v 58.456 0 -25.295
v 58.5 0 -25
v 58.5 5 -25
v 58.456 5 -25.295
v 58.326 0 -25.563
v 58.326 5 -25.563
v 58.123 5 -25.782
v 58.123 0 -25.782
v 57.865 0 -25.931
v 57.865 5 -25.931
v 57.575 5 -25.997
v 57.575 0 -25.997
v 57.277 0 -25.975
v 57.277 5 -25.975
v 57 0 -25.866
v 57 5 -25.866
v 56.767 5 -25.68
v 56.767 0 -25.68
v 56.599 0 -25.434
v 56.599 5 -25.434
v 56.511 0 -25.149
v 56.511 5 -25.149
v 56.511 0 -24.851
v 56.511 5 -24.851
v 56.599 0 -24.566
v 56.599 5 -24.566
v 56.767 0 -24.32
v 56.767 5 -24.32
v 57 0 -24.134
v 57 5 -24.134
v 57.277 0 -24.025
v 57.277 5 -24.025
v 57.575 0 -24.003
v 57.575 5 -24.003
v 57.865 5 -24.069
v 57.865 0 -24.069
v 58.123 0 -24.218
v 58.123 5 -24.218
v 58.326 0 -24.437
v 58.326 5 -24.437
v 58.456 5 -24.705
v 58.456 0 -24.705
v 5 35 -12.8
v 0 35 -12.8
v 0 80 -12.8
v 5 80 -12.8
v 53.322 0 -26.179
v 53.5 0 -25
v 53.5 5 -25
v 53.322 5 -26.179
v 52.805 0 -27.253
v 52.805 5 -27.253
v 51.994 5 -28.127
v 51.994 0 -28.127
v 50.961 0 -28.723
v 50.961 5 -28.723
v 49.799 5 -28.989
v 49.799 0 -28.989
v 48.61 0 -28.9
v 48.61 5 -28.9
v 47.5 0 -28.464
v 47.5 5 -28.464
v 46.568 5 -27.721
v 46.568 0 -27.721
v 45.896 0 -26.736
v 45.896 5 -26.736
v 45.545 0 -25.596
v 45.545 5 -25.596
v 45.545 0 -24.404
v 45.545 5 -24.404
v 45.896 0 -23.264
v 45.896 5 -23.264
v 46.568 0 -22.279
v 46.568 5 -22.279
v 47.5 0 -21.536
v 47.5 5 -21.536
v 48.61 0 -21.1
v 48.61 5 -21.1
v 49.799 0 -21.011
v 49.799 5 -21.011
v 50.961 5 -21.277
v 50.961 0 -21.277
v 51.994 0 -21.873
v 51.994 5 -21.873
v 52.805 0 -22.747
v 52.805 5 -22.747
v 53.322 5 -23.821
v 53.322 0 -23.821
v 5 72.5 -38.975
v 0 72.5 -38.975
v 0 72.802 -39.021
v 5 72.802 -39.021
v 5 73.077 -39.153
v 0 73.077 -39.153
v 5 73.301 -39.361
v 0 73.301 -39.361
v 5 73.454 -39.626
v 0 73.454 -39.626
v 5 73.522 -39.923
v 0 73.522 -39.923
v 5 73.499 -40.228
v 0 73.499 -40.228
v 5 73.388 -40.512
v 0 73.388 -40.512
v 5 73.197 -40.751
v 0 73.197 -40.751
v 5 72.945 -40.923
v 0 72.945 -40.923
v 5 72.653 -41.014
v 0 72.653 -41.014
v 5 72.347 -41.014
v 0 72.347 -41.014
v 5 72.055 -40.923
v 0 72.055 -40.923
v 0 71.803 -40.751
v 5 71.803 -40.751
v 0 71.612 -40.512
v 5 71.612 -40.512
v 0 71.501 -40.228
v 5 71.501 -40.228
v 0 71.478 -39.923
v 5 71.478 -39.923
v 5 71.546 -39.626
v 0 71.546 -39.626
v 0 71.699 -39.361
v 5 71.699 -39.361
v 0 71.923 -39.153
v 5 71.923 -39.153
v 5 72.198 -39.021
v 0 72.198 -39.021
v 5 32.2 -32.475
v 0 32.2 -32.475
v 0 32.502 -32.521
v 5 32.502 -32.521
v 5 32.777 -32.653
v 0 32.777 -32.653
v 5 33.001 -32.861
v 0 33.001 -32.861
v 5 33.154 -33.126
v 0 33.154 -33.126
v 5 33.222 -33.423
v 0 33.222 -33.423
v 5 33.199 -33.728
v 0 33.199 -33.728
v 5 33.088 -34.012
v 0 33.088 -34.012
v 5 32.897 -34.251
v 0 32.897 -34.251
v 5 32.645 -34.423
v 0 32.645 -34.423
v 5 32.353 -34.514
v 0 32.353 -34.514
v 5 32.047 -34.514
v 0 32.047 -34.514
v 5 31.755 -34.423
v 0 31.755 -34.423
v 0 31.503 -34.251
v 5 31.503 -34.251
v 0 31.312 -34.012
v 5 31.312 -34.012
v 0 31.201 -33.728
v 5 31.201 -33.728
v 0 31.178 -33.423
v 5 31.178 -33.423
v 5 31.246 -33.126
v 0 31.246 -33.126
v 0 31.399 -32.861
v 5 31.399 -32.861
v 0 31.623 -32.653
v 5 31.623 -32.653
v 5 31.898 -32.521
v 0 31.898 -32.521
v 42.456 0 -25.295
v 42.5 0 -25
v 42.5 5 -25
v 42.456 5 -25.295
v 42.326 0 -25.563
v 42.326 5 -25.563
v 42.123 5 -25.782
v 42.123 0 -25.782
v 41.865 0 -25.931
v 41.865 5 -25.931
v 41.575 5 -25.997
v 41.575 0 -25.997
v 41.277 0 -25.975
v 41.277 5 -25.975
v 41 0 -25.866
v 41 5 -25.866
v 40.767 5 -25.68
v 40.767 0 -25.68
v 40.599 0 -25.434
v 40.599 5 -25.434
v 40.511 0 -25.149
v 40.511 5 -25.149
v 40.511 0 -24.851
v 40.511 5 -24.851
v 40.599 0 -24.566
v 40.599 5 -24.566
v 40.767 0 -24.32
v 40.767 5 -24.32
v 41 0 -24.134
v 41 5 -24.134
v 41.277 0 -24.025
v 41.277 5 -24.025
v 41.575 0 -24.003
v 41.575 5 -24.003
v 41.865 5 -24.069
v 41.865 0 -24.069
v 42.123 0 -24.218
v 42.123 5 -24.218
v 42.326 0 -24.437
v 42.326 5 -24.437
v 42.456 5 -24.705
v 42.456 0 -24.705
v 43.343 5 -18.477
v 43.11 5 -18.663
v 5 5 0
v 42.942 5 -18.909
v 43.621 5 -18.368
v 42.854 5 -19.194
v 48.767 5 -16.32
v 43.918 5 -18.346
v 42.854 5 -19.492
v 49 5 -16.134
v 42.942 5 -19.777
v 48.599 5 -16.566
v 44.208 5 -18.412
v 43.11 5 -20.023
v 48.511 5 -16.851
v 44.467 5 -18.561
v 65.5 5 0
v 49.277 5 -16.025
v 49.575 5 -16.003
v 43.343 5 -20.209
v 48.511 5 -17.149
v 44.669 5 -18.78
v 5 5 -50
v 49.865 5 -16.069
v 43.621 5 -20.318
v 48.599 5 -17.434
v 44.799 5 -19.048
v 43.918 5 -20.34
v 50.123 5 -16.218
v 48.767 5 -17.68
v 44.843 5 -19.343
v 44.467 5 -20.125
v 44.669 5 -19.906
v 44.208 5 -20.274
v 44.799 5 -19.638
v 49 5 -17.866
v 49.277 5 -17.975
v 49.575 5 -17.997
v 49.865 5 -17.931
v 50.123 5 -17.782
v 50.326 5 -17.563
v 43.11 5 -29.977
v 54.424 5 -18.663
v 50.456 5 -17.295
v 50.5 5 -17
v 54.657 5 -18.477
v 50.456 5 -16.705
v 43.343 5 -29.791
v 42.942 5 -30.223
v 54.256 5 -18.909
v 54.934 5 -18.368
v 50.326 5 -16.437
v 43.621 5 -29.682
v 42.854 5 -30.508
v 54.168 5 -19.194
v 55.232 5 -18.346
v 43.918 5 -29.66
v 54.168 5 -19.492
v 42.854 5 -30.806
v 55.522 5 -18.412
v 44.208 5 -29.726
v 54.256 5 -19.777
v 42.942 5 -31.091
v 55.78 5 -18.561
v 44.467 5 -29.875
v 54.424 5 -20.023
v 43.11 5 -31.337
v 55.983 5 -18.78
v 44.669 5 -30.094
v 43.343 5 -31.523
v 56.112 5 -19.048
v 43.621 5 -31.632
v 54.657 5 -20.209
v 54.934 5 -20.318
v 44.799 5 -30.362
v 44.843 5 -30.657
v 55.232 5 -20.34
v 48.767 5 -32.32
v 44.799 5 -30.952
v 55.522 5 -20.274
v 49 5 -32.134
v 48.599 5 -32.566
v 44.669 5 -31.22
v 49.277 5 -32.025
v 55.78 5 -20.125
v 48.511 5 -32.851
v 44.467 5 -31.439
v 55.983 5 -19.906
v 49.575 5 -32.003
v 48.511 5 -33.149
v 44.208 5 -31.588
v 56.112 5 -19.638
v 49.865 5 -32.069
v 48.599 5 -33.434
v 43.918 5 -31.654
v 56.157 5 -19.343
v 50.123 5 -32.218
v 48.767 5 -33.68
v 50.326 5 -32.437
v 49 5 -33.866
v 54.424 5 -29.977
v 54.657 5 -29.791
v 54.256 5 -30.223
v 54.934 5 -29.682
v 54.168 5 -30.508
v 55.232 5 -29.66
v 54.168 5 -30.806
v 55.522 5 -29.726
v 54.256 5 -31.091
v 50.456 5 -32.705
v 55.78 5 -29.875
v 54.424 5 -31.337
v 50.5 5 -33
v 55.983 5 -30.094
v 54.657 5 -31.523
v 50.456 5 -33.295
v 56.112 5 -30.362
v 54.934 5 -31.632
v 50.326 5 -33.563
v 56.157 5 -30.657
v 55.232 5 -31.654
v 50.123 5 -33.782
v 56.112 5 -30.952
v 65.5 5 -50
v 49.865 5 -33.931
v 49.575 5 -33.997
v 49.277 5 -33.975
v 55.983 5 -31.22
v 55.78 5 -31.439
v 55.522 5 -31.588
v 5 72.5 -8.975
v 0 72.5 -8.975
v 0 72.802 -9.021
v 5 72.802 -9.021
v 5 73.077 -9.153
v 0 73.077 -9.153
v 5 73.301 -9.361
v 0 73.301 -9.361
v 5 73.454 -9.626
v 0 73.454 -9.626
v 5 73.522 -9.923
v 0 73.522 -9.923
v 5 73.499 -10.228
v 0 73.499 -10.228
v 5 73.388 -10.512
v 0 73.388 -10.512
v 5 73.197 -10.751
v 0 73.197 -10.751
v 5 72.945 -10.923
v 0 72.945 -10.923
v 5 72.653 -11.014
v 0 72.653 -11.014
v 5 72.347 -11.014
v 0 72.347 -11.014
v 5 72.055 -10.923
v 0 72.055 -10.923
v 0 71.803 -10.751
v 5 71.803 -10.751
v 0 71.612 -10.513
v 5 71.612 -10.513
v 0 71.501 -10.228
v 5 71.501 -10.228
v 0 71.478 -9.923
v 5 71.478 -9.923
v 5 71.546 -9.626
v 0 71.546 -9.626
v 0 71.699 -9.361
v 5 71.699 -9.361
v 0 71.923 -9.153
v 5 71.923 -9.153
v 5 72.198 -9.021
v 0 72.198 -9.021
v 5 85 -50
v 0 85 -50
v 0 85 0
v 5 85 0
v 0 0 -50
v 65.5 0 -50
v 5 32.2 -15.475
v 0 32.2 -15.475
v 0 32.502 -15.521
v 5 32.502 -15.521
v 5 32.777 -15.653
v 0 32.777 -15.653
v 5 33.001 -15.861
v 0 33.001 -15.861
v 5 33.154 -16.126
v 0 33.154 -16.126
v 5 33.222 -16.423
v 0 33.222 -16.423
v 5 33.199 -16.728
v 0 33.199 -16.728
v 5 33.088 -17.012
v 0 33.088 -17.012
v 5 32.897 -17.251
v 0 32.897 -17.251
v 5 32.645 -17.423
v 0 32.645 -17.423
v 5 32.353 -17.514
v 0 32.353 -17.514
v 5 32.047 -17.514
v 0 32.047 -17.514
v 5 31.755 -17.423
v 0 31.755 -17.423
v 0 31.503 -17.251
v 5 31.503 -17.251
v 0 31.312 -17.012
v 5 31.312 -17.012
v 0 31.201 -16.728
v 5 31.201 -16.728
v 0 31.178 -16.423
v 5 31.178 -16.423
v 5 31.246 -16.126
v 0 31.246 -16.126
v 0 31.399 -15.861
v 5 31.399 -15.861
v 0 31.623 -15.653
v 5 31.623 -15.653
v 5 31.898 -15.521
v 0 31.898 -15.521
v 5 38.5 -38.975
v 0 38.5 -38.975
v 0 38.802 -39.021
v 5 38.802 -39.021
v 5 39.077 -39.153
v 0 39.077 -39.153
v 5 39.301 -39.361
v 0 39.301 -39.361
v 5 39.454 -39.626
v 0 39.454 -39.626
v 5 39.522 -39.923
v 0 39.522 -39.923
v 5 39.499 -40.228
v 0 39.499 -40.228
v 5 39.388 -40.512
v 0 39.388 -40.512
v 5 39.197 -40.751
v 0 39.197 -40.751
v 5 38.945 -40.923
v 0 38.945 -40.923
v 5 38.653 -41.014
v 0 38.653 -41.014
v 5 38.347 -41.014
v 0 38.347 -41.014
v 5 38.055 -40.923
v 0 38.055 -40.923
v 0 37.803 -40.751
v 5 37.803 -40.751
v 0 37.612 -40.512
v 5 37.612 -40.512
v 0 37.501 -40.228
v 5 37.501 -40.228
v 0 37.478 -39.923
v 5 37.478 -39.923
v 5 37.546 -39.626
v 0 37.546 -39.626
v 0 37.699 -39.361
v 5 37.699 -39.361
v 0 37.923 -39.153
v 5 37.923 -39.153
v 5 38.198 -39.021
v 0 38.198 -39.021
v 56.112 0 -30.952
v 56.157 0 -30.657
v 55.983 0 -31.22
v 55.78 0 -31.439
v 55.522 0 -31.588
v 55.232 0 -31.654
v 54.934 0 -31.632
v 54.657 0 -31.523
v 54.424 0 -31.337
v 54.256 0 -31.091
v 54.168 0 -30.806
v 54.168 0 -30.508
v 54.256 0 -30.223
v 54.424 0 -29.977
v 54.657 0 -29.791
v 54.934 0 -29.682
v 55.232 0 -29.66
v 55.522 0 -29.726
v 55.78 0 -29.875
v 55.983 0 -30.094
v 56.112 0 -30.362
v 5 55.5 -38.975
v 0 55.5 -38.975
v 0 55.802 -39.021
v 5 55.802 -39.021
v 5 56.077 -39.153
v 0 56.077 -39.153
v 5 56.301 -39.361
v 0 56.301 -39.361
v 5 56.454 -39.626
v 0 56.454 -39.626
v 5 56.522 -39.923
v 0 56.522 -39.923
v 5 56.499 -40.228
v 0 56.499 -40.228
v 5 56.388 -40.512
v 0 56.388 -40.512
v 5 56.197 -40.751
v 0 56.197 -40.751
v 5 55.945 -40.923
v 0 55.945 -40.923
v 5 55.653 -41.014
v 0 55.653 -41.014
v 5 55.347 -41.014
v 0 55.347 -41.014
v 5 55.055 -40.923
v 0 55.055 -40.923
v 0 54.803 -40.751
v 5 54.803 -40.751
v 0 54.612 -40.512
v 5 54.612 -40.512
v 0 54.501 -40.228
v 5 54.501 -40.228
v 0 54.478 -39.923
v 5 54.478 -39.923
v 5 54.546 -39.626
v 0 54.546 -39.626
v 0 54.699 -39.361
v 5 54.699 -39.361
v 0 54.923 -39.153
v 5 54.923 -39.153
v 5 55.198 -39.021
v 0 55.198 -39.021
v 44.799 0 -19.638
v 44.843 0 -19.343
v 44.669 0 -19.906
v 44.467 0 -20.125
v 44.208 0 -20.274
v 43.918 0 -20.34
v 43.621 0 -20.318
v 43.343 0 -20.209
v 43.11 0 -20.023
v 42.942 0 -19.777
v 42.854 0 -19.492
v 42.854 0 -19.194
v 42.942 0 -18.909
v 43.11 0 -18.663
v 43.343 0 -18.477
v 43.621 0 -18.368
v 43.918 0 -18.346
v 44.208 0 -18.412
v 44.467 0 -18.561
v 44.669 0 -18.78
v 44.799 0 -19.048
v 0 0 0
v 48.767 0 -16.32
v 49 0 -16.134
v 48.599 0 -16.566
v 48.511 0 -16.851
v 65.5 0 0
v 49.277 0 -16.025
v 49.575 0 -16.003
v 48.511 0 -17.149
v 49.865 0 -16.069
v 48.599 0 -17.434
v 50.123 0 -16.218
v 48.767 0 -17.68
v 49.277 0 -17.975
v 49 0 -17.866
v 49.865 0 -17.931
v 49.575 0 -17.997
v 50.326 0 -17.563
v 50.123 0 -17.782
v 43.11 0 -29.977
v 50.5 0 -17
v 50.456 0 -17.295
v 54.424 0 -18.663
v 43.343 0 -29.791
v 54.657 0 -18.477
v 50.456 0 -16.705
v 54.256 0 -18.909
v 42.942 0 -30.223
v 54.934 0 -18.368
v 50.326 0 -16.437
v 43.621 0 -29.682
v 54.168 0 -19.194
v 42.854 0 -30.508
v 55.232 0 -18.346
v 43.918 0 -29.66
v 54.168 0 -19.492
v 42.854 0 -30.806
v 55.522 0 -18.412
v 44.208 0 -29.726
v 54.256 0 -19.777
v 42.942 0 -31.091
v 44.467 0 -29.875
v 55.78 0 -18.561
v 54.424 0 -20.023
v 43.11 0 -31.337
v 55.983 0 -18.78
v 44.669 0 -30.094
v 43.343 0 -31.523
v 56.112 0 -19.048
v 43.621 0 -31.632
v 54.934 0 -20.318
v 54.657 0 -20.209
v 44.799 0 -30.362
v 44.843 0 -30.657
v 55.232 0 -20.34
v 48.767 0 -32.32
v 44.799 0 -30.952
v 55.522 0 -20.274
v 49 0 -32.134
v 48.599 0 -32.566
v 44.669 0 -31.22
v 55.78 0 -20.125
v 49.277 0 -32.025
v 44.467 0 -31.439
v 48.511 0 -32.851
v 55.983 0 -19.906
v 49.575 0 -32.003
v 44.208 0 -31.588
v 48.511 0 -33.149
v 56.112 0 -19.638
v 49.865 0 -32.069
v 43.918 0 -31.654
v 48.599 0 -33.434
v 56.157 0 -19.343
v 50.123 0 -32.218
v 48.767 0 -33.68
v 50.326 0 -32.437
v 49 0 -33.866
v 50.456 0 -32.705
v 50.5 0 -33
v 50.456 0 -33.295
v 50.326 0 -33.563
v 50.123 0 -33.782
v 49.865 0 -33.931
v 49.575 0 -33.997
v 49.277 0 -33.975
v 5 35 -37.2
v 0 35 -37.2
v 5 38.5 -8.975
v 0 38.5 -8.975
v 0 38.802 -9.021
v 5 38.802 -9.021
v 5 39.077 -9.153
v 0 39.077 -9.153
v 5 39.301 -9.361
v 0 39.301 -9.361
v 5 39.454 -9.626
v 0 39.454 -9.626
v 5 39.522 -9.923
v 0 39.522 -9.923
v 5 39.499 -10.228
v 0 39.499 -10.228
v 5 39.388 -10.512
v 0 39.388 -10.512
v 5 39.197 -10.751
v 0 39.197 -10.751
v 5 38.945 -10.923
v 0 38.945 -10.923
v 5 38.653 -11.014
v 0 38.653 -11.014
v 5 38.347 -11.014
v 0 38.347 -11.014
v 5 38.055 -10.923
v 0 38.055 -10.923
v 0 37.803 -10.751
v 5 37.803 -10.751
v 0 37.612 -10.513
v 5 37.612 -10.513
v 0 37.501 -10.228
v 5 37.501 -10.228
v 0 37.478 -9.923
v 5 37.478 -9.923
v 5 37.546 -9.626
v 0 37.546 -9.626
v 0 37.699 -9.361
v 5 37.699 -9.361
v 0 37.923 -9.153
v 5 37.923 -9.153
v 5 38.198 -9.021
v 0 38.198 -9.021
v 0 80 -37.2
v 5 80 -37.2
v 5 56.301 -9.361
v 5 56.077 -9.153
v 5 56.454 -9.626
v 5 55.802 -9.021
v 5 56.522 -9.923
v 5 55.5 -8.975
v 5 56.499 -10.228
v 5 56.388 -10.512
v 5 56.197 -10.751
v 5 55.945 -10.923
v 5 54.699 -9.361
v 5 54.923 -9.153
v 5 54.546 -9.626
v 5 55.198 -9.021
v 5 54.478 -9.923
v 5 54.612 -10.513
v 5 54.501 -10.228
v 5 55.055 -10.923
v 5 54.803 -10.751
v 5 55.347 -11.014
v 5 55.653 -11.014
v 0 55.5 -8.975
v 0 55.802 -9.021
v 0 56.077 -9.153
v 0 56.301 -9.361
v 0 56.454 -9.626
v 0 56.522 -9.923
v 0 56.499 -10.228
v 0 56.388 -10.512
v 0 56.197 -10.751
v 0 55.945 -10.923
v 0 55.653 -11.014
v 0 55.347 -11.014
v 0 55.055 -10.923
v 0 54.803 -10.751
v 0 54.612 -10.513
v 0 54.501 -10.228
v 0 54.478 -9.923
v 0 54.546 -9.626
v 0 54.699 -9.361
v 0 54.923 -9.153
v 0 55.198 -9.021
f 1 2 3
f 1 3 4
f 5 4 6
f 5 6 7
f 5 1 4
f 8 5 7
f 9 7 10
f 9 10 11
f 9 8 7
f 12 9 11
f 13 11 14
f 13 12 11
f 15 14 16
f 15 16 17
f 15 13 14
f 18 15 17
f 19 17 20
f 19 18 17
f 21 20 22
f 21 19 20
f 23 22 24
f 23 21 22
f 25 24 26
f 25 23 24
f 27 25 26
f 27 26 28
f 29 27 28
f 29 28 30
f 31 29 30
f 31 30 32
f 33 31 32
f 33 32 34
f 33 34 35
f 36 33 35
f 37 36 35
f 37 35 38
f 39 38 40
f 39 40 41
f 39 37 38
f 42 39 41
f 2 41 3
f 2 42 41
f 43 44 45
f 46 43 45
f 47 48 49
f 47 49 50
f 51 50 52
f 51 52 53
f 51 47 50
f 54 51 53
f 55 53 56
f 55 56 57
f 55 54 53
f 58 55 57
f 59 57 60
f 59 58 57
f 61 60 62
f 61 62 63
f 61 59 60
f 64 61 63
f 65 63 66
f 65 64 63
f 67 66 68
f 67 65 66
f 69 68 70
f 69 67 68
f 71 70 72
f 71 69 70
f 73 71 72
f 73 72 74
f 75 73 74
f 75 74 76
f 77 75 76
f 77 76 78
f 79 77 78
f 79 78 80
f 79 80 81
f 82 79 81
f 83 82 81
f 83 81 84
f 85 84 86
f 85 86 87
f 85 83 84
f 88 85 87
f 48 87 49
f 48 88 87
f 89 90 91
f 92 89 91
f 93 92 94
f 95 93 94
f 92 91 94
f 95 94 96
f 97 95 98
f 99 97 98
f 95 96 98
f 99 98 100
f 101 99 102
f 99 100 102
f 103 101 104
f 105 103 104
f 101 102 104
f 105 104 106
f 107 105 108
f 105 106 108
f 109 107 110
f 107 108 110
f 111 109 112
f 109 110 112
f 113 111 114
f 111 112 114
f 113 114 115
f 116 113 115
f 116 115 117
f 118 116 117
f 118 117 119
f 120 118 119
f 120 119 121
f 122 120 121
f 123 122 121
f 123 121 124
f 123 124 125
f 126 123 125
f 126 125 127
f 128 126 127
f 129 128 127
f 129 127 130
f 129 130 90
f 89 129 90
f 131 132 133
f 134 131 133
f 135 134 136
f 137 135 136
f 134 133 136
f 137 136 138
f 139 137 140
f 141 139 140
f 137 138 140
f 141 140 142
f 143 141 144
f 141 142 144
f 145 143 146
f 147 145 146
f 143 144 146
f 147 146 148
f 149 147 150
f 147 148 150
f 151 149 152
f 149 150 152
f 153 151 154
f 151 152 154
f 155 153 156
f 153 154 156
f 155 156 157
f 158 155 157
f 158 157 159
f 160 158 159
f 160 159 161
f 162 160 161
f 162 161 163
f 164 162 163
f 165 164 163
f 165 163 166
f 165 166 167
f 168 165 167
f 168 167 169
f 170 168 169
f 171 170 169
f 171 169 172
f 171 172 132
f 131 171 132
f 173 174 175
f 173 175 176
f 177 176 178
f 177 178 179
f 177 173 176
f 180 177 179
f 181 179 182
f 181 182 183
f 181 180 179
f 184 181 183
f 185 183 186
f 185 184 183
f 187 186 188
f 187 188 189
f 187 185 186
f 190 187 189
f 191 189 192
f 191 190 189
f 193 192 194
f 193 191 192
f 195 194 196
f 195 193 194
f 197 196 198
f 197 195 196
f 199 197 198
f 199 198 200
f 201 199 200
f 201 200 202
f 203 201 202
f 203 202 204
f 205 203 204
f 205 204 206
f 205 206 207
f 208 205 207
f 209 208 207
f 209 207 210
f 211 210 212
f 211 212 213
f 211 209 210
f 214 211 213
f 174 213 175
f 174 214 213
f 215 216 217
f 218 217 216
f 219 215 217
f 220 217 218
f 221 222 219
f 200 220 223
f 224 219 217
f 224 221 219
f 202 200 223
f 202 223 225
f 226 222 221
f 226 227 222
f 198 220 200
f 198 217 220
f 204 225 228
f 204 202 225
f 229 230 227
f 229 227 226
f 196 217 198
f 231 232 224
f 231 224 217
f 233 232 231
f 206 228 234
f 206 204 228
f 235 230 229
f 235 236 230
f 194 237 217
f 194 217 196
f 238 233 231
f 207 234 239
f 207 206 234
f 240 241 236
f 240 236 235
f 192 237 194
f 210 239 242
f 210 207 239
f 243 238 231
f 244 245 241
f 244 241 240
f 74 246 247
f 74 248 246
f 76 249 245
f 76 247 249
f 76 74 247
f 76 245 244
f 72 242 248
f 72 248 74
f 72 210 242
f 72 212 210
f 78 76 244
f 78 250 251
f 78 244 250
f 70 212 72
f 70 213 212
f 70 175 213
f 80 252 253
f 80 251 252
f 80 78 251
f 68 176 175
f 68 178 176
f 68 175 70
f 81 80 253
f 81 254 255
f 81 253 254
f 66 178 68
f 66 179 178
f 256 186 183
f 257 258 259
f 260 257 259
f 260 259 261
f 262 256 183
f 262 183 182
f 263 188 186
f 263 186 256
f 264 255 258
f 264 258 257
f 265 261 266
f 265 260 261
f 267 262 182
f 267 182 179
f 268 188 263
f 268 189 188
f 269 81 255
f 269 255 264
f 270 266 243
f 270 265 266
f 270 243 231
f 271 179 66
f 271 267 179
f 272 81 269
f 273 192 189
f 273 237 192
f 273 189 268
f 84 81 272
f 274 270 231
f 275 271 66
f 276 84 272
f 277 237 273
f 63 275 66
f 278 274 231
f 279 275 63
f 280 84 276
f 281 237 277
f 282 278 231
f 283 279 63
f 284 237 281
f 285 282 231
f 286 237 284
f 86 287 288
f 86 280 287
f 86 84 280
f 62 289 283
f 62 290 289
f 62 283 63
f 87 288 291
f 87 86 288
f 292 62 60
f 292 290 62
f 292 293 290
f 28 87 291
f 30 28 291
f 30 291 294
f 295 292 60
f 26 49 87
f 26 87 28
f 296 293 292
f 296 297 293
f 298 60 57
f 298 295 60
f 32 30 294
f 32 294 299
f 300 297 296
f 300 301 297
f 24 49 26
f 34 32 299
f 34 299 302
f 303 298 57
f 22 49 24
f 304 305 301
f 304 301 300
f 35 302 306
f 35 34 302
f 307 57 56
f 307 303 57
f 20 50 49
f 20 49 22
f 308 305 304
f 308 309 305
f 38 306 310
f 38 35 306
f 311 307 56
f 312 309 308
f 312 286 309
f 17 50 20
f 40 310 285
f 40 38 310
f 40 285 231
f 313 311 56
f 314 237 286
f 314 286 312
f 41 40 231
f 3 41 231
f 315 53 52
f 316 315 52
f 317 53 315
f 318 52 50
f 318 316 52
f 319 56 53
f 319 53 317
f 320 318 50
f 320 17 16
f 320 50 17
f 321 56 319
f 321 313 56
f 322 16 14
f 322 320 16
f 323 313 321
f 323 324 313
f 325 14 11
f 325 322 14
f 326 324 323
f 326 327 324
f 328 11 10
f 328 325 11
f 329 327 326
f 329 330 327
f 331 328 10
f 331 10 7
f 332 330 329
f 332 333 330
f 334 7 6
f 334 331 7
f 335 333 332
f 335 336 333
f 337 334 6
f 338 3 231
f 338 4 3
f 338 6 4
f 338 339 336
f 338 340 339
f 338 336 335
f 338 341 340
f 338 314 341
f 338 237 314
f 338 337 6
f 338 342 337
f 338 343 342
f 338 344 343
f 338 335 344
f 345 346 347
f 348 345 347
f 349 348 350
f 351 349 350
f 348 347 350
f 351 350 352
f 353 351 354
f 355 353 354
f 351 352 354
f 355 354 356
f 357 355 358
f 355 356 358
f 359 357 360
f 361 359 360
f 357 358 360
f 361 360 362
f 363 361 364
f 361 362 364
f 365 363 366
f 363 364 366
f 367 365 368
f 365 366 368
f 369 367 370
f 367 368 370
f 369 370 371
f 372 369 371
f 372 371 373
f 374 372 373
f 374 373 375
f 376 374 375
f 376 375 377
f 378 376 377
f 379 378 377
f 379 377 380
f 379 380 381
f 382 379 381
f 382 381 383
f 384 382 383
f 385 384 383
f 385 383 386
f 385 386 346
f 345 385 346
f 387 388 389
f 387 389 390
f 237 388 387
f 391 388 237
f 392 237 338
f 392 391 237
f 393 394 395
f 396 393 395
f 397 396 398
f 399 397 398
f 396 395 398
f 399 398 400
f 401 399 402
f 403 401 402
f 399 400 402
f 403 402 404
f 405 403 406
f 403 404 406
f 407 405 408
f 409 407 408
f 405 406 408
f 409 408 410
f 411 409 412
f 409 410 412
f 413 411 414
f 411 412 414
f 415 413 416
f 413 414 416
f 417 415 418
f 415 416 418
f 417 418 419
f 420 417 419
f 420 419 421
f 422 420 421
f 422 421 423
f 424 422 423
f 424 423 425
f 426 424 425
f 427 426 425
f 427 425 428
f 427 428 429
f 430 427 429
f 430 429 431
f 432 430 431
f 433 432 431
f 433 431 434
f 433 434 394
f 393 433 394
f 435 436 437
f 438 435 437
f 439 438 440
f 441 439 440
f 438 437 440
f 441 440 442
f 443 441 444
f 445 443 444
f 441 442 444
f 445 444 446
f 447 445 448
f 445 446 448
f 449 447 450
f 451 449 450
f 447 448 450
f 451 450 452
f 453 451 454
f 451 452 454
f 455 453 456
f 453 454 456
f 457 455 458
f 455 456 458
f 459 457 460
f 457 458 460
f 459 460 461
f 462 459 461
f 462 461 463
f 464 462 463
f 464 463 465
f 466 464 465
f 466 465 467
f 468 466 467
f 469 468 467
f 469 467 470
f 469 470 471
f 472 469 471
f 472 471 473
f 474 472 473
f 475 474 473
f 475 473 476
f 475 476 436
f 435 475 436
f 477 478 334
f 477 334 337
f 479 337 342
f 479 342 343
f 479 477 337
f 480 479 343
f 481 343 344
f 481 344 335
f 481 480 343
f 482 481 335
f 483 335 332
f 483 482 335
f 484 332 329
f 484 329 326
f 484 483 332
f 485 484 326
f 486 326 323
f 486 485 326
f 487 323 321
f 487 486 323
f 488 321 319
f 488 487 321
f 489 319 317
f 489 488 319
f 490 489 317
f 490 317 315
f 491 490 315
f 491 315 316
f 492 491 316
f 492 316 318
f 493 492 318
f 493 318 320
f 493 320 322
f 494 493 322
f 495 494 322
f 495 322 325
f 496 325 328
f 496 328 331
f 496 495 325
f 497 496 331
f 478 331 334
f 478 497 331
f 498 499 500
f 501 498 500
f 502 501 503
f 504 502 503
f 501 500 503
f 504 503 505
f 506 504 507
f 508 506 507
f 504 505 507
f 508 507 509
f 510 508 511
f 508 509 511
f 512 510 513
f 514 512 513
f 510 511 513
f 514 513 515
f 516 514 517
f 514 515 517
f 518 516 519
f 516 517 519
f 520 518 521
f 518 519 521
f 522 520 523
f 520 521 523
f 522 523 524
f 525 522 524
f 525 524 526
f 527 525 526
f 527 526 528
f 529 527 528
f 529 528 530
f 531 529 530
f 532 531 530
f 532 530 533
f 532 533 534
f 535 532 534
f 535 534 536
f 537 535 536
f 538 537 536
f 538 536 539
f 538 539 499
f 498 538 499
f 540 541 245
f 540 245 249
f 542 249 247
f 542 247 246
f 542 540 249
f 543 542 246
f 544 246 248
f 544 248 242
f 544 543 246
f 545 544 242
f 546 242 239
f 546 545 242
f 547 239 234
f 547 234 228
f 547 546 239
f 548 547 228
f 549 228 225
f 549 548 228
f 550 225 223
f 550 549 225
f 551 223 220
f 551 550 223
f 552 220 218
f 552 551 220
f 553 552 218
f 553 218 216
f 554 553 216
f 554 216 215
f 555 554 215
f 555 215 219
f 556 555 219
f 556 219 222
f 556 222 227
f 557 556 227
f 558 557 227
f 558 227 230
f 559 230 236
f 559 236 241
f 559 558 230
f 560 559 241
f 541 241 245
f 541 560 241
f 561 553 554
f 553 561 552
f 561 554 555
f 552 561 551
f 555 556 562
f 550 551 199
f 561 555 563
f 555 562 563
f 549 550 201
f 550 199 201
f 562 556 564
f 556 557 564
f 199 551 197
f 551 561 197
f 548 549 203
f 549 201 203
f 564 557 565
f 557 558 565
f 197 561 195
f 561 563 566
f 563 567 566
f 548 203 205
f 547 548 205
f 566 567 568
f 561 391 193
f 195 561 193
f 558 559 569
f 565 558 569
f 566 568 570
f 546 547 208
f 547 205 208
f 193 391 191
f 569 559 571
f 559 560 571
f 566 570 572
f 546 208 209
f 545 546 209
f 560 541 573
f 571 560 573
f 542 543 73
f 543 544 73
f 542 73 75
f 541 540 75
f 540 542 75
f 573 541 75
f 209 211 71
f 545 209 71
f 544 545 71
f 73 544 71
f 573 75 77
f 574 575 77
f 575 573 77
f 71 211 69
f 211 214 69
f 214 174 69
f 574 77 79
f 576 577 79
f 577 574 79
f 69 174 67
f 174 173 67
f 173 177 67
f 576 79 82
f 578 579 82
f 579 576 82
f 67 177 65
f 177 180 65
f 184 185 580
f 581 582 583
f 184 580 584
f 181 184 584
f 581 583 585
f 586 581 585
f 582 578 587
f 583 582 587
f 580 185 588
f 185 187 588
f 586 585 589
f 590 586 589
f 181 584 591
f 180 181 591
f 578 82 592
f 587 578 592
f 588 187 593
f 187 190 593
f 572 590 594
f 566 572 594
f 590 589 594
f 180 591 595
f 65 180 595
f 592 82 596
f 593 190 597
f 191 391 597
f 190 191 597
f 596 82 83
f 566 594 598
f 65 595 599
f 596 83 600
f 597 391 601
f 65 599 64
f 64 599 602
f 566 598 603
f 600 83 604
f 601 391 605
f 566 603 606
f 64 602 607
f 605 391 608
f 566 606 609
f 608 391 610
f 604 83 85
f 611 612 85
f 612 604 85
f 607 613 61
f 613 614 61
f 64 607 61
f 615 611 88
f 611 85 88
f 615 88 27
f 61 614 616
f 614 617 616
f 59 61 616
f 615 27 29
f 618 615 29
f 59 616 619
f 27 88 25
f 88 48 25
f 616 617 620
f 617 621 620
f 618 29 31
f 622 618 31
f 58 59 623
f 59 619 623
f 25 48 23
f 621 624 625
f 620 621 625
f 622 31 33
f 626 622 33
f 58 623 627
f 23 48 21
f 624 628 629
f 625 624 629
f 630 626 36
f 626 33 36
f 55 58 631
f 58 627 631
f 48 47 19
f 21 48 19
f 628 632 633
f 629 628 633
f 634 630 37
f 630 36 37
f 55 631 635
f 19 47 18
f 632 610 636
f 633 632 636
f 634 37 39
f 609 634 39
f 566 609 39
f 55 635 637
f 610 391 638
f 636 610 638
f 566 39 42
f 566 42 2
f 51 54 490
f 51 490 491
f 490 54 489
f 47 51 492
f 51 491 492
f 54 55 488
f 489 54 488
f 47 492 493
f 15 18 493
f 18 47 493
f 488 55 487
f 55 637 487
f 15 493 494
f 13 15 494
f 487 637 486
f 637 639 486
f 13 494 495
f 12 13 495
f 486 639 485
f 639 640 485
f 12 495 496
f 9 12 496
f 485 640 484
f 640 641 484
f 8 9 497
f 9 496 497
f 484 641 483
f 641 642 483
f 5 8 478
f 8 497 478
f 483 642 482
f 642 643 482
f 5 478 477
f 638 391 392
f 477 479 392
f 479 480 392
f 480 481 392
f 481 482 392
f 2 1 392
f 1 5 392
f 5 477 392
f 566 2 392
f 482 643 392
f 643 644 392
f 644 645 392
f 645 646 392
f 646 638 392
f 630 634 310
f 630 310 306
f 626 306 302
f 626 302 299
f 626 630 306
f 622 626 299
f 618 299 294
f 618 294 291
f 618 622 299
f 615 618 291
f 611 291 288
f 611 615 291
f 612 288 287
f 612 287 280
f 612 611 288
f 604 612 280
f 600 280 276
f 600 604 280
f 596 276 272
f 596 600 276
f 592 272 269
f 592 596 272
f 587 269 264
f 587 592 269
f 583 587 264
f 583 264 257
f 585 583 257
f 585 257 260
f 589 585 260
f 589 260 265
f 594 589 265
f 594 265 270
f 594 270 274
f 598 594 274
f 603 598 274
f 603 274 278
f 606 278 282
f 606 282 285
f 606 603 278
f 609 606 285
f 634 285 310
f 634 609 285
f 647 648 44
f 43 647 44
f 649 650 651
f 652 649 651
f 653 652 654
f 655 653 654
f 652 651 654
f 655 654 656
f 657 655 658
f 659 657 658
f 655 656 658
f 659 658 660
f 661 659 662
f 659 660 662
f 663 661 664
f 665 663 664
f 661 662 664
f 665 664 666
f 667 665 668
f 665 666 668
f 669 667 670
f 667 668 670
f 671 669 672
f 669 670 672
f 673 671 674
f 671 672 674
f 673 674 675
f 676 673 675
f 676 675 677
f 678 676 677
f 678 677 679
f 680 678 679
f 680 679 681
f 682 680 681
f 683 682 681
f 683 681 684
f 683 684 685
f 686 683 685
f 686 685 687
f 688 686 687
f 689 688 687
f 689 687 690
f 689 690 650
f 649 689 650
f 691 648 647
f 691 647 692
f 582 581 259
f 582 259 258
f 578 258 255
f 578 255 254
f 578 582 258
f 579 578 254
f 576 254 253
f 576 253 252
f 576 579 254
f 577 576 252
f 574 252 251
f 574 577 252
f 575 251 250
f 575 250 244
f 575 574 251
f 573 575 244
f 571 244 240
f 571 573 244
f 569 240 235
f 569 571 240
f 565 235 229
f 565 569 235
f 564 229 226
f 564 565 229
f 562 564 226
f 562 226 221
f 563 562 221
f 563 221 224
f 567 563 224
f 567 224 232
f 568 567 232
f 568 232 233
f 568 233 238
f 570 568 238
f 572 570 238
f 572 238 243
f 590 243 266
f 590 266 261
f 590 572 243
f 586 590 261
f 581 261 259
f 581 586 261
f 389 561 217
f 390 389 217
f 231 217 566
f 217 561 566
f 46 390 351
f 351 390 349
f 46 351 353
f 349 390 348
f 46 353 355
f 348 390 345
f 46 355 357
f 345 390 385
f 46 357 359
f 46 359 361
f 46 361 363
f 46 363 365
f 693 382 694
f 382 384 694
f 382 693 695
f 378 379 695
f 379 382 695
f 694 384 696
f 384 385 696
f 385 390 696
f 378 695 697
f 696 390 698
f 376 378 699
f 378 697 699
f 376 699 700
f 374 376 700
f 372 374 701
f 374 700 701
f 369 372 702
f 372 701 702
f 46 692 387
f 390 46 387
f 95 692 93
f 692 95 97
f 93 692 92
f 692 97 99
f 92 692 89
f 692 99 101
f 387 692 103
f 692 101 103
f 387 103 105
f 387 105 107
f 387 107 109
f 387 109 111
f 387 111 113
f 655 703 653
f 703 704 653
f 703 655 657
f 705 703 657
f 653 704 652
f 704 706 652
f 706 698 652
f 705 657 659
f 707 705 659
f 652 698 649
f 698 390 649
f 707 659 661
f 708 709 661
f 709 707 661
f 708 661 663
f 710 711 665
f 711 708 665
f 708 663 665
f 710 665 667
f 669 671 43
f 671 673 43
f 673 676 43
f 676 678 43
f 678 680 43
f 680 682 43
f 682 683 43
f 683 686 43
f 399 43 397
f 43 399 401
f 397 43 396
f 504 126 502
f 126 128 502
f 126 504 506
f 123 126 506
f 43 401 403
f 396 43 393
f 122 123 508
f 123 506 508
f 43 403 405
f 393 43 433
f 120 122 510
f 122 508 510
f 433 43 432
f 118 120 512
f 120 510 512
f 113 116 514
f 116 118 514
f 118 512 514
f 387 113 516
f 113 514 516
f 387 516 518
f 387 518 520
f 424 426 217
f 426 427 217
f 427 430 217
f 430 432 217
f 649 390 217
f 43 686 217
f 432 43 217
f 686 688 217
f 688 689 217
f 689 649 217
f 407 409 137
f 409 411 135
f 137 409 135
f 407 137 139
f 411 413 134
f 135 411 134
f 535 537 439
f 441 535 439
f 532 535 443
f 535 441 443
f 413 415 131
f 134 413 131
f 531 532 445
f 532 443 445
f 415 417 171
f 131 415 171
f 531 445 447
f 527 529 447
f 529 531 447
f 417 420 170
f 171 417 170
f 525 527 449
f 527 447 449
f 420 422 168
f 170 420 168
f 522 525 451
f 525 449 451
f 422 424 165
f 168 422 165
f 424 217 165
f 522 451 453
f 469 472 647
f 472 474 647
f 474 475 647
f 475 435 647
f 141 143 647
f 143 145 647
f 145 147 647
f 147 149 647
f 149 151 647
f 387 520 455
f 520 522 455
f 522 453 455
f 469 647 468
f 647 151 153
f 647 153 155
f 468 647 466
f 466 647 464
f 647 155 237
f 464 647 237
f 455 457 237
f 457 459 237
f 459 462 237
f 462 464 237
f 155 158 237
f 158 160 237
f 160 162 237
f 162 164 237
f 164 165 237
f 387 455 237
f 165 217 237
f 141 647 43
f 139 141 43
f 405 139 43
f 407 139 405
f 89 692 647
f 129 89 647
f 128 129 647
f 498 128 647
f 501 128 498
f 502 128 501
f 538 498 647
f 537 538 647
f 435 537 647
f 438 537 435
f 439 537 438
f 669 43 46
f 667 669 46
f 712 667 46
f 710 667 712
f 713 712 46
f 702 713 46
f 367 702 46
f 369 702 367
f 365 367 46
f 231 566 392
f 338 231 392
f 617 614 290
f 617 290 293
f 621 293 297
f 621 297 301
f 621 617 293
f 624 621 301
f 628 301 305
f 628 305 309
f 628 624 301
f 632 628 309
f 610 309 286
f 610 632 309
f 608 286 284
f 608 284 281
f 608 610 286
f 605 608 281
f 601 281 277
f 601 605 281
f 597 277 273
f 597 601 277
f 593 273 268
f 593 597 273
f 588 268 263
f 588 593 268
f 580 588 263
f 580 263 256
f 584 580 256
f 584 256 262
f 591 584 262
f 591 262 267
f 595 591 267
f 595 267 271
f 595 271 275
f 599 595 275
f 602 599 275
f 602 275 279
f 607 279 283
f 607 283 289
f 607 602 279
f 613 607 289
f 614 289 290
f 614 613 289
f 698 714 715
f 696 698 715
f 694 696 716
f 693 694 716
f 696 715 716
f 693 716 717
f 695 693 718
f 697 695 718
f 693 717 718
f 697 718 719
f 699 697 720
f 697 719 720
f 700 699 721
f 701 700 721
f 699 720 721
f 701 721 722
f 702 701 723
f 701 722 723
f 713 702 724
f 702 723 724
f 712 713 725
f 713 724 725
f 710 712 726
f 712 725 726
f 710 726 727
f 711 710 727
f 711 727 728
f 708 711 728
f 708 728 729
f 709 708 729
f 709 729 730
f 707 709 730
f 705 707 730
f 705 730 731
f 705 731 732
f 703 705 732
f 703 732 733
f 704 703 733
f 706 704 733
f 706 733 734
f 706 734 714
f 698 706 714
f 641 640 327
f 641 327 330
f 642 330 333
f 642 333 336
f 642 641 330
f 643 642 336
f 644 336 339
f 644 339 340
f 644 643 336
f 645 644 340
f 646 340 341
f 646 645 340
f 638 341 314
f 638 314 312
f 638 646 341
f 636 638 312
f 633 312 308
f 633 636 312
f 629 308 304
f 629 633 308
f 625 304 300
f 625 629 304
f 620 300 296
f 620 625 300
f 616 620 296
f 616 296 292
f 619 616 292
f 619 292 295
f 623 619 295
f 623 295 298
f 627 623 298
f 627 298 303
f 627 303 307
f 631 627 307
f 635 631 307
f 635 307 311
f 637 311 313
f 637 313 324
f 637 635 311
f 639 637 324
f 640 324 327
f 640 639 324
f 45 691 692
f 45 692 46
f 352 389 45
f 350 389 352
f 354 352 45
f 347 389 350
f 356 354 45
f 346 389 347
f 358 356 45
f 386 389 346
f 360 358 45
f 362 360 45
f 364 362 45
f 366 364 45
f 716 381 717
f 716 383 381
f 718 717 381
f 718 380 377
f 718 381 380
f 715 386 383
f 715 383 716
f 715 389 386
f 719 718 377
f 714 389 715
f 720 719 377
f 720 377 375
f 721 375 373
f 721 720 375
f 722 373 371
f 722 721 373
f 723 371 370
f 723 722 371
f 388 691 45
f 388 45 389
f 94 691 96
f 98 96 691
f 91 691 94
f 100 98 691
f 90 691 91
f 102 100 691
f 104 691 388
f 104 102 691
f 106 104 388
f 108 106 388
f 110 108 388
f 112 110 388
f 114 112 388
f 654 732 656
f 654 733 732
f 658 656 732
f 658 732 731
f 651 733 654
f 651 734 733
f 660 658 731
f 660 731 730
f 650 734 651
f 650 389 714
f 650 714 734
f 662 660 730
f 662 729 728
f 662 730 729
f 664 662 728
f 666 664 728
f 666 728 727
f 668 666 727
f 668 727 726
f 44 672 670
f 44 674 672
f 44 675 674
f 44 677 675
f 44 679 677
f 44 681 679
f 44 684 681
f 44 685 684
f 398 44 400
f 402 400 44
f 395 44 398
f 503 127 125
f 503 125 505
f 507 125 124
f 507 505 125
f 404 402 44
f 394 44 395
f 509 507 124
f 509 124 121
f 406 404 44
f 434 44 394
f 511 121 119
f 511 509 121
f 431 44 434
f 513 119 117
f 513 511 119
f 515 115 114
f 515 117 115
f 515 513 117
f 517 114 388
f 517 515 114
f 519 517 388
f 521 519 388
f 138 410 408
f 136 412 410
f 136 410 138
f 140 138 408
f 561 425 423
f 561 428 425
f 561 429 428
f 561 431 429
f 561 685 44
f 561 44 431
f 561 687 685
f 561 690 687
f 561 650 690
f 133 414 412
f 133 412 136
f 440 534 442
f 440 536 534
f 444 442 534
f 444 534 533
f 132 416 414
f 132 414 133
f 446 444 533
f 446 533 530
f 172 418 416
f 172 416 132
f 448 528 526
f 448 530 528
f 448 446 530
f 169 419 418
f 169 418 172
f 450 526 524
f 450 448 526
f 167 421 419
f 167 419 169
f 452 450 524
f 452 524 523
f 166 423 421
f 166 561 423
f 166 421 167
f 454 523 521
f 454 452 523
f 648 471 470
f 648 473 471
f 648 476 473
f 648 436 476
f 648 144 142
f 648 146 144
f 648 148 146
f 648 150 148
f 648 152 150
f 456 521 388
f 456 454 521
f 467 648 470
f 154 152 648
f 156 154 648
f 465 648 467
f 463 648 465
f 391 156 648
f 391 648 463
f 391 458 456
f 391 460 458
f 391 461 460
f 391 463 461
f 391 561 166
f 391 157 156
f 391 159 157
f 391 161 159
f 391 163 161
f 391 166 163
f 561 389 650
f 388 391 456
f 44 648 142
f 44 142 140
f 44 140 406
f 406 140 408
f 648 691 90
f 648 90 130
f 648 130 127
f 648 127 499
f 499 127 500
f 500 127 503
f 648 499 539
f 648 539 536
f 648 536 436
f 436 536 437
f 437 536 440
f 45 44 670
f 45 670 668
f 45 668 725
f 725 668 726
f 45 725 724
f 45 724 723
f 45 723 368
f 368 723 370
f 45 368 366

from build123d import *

# Parameters (mm, degrees)
SKETCH1_W           = 65.5
SKETCH1_H           = 50
SKETCH1_R           = 4
SKETCH1_R_2         = 1
BOSS_EXTRUDE1_DEPTH = 5
SKETCH3_W           = 5
SKETCH3_H           = 50
BOSS_EXTRUDE2_DEPTH = 85
SKETCH4_R           = 1.025
SKETCH4_W           = 24.4
SKETCH4_H           = 45
CUT_EXTRUDE1_DEPTH  = 66.5


with BuildPart() as part:
    # Sketch1 → Boss-Extrude1 (new body)
    with BuildSketch(Plane(origin=(0, 0, 0), x_dir=(1, 0, 0), z_dir=(0, 1, 0))):
        with Locations((32.75, 25)):
            Rectangle(SKETCH1_W, SKETCH1_H)
        with Locations((49.5, 25)):
            Circle(SKETCH1_R, mode=Mode.SUBTRACT)
        with Locations((49.5, 33)):
            Circle(SKETCH1_R_2, mode=Mode.SUBTRACT)
        with Locations((55.156854249, 30.656854249)):
            Circle(SKETCH1_R_2, mode=Mode.SUBTRACT)
        with Locations((57.5, 25)):
            Circle(SKETCH1_R_2, mode=Mode.SUBTRACT)
        with Locations((55.156854249, 19.343145751)):
            Circle(SKETCH1_R_2, mode=Mode.SUBTRACT)
        with Locations((49.5, 17)):
            Circle(SKETCH1_R_2, mode=Mode.SUBTRACT)
        with Locations((43.843145751, 19.343145751)):
            Circle(SKETCH1_R_2, mode=Mode.SUBTRACT)
        with Locations((41.5, 25)):
            Circle(SKETCH1_R_2, mode=Mode.SUBTRACT)
        with Locations((43.843145751, 30.656854249)):
            Circle(SKETCH1_R_2, mode=Mode.SUBTRACT)
    extrude(amount=BOSS_EXTRUDE1_DEPTH)

    # Sketch3 → Boss-Extrude2 (add)
    with BuildSketch(Plane(origin=(0, 0, 0), x_dir=(1, 0, 0), z_dir=(0, 1, 0))):
        with Locations((2.5, 25)):
            Rectangle(SKETCH3_W, SKETCH3_H)
    extrude(amount=BOSS_EXTRUDE2_DEPTH)

    # Sketch4 → Cut-Extrude1 (cut, through all)
    with BuildSketch(Plane.ZY):
        with Locations((-40, 72.5)):
            Circle(SKETCH4_R)
        with Locations((-10, 72.5)):
            Circle(SKETCH4_R)
        with Locations((-40, 55.5)):
            Circle(SKETCH4_R)
        with Locations((-40, 38.5)):
            Circle(SKETCH4_R)
        with Locations((-10, 55.5)):
            Circle(SKETCH4_R)
        with Locations((-33.5, 32.2)):
            Circle(SKETCH4_R)
        with Locations((-16.5, 32.2)):
            Circle(SKETCH4_R)
        with Locations((-10, 38.5)):
            Circle(SKETCH4_R)
        with Locations((-25, 57.5)):
            Rectangle(SKETCH4_W, SKETCH4_H)
    extrude(amount=-CUT_EXTRUDE1_DEPTH, mode=Mode.SUBTRACT)


solid = part.part
